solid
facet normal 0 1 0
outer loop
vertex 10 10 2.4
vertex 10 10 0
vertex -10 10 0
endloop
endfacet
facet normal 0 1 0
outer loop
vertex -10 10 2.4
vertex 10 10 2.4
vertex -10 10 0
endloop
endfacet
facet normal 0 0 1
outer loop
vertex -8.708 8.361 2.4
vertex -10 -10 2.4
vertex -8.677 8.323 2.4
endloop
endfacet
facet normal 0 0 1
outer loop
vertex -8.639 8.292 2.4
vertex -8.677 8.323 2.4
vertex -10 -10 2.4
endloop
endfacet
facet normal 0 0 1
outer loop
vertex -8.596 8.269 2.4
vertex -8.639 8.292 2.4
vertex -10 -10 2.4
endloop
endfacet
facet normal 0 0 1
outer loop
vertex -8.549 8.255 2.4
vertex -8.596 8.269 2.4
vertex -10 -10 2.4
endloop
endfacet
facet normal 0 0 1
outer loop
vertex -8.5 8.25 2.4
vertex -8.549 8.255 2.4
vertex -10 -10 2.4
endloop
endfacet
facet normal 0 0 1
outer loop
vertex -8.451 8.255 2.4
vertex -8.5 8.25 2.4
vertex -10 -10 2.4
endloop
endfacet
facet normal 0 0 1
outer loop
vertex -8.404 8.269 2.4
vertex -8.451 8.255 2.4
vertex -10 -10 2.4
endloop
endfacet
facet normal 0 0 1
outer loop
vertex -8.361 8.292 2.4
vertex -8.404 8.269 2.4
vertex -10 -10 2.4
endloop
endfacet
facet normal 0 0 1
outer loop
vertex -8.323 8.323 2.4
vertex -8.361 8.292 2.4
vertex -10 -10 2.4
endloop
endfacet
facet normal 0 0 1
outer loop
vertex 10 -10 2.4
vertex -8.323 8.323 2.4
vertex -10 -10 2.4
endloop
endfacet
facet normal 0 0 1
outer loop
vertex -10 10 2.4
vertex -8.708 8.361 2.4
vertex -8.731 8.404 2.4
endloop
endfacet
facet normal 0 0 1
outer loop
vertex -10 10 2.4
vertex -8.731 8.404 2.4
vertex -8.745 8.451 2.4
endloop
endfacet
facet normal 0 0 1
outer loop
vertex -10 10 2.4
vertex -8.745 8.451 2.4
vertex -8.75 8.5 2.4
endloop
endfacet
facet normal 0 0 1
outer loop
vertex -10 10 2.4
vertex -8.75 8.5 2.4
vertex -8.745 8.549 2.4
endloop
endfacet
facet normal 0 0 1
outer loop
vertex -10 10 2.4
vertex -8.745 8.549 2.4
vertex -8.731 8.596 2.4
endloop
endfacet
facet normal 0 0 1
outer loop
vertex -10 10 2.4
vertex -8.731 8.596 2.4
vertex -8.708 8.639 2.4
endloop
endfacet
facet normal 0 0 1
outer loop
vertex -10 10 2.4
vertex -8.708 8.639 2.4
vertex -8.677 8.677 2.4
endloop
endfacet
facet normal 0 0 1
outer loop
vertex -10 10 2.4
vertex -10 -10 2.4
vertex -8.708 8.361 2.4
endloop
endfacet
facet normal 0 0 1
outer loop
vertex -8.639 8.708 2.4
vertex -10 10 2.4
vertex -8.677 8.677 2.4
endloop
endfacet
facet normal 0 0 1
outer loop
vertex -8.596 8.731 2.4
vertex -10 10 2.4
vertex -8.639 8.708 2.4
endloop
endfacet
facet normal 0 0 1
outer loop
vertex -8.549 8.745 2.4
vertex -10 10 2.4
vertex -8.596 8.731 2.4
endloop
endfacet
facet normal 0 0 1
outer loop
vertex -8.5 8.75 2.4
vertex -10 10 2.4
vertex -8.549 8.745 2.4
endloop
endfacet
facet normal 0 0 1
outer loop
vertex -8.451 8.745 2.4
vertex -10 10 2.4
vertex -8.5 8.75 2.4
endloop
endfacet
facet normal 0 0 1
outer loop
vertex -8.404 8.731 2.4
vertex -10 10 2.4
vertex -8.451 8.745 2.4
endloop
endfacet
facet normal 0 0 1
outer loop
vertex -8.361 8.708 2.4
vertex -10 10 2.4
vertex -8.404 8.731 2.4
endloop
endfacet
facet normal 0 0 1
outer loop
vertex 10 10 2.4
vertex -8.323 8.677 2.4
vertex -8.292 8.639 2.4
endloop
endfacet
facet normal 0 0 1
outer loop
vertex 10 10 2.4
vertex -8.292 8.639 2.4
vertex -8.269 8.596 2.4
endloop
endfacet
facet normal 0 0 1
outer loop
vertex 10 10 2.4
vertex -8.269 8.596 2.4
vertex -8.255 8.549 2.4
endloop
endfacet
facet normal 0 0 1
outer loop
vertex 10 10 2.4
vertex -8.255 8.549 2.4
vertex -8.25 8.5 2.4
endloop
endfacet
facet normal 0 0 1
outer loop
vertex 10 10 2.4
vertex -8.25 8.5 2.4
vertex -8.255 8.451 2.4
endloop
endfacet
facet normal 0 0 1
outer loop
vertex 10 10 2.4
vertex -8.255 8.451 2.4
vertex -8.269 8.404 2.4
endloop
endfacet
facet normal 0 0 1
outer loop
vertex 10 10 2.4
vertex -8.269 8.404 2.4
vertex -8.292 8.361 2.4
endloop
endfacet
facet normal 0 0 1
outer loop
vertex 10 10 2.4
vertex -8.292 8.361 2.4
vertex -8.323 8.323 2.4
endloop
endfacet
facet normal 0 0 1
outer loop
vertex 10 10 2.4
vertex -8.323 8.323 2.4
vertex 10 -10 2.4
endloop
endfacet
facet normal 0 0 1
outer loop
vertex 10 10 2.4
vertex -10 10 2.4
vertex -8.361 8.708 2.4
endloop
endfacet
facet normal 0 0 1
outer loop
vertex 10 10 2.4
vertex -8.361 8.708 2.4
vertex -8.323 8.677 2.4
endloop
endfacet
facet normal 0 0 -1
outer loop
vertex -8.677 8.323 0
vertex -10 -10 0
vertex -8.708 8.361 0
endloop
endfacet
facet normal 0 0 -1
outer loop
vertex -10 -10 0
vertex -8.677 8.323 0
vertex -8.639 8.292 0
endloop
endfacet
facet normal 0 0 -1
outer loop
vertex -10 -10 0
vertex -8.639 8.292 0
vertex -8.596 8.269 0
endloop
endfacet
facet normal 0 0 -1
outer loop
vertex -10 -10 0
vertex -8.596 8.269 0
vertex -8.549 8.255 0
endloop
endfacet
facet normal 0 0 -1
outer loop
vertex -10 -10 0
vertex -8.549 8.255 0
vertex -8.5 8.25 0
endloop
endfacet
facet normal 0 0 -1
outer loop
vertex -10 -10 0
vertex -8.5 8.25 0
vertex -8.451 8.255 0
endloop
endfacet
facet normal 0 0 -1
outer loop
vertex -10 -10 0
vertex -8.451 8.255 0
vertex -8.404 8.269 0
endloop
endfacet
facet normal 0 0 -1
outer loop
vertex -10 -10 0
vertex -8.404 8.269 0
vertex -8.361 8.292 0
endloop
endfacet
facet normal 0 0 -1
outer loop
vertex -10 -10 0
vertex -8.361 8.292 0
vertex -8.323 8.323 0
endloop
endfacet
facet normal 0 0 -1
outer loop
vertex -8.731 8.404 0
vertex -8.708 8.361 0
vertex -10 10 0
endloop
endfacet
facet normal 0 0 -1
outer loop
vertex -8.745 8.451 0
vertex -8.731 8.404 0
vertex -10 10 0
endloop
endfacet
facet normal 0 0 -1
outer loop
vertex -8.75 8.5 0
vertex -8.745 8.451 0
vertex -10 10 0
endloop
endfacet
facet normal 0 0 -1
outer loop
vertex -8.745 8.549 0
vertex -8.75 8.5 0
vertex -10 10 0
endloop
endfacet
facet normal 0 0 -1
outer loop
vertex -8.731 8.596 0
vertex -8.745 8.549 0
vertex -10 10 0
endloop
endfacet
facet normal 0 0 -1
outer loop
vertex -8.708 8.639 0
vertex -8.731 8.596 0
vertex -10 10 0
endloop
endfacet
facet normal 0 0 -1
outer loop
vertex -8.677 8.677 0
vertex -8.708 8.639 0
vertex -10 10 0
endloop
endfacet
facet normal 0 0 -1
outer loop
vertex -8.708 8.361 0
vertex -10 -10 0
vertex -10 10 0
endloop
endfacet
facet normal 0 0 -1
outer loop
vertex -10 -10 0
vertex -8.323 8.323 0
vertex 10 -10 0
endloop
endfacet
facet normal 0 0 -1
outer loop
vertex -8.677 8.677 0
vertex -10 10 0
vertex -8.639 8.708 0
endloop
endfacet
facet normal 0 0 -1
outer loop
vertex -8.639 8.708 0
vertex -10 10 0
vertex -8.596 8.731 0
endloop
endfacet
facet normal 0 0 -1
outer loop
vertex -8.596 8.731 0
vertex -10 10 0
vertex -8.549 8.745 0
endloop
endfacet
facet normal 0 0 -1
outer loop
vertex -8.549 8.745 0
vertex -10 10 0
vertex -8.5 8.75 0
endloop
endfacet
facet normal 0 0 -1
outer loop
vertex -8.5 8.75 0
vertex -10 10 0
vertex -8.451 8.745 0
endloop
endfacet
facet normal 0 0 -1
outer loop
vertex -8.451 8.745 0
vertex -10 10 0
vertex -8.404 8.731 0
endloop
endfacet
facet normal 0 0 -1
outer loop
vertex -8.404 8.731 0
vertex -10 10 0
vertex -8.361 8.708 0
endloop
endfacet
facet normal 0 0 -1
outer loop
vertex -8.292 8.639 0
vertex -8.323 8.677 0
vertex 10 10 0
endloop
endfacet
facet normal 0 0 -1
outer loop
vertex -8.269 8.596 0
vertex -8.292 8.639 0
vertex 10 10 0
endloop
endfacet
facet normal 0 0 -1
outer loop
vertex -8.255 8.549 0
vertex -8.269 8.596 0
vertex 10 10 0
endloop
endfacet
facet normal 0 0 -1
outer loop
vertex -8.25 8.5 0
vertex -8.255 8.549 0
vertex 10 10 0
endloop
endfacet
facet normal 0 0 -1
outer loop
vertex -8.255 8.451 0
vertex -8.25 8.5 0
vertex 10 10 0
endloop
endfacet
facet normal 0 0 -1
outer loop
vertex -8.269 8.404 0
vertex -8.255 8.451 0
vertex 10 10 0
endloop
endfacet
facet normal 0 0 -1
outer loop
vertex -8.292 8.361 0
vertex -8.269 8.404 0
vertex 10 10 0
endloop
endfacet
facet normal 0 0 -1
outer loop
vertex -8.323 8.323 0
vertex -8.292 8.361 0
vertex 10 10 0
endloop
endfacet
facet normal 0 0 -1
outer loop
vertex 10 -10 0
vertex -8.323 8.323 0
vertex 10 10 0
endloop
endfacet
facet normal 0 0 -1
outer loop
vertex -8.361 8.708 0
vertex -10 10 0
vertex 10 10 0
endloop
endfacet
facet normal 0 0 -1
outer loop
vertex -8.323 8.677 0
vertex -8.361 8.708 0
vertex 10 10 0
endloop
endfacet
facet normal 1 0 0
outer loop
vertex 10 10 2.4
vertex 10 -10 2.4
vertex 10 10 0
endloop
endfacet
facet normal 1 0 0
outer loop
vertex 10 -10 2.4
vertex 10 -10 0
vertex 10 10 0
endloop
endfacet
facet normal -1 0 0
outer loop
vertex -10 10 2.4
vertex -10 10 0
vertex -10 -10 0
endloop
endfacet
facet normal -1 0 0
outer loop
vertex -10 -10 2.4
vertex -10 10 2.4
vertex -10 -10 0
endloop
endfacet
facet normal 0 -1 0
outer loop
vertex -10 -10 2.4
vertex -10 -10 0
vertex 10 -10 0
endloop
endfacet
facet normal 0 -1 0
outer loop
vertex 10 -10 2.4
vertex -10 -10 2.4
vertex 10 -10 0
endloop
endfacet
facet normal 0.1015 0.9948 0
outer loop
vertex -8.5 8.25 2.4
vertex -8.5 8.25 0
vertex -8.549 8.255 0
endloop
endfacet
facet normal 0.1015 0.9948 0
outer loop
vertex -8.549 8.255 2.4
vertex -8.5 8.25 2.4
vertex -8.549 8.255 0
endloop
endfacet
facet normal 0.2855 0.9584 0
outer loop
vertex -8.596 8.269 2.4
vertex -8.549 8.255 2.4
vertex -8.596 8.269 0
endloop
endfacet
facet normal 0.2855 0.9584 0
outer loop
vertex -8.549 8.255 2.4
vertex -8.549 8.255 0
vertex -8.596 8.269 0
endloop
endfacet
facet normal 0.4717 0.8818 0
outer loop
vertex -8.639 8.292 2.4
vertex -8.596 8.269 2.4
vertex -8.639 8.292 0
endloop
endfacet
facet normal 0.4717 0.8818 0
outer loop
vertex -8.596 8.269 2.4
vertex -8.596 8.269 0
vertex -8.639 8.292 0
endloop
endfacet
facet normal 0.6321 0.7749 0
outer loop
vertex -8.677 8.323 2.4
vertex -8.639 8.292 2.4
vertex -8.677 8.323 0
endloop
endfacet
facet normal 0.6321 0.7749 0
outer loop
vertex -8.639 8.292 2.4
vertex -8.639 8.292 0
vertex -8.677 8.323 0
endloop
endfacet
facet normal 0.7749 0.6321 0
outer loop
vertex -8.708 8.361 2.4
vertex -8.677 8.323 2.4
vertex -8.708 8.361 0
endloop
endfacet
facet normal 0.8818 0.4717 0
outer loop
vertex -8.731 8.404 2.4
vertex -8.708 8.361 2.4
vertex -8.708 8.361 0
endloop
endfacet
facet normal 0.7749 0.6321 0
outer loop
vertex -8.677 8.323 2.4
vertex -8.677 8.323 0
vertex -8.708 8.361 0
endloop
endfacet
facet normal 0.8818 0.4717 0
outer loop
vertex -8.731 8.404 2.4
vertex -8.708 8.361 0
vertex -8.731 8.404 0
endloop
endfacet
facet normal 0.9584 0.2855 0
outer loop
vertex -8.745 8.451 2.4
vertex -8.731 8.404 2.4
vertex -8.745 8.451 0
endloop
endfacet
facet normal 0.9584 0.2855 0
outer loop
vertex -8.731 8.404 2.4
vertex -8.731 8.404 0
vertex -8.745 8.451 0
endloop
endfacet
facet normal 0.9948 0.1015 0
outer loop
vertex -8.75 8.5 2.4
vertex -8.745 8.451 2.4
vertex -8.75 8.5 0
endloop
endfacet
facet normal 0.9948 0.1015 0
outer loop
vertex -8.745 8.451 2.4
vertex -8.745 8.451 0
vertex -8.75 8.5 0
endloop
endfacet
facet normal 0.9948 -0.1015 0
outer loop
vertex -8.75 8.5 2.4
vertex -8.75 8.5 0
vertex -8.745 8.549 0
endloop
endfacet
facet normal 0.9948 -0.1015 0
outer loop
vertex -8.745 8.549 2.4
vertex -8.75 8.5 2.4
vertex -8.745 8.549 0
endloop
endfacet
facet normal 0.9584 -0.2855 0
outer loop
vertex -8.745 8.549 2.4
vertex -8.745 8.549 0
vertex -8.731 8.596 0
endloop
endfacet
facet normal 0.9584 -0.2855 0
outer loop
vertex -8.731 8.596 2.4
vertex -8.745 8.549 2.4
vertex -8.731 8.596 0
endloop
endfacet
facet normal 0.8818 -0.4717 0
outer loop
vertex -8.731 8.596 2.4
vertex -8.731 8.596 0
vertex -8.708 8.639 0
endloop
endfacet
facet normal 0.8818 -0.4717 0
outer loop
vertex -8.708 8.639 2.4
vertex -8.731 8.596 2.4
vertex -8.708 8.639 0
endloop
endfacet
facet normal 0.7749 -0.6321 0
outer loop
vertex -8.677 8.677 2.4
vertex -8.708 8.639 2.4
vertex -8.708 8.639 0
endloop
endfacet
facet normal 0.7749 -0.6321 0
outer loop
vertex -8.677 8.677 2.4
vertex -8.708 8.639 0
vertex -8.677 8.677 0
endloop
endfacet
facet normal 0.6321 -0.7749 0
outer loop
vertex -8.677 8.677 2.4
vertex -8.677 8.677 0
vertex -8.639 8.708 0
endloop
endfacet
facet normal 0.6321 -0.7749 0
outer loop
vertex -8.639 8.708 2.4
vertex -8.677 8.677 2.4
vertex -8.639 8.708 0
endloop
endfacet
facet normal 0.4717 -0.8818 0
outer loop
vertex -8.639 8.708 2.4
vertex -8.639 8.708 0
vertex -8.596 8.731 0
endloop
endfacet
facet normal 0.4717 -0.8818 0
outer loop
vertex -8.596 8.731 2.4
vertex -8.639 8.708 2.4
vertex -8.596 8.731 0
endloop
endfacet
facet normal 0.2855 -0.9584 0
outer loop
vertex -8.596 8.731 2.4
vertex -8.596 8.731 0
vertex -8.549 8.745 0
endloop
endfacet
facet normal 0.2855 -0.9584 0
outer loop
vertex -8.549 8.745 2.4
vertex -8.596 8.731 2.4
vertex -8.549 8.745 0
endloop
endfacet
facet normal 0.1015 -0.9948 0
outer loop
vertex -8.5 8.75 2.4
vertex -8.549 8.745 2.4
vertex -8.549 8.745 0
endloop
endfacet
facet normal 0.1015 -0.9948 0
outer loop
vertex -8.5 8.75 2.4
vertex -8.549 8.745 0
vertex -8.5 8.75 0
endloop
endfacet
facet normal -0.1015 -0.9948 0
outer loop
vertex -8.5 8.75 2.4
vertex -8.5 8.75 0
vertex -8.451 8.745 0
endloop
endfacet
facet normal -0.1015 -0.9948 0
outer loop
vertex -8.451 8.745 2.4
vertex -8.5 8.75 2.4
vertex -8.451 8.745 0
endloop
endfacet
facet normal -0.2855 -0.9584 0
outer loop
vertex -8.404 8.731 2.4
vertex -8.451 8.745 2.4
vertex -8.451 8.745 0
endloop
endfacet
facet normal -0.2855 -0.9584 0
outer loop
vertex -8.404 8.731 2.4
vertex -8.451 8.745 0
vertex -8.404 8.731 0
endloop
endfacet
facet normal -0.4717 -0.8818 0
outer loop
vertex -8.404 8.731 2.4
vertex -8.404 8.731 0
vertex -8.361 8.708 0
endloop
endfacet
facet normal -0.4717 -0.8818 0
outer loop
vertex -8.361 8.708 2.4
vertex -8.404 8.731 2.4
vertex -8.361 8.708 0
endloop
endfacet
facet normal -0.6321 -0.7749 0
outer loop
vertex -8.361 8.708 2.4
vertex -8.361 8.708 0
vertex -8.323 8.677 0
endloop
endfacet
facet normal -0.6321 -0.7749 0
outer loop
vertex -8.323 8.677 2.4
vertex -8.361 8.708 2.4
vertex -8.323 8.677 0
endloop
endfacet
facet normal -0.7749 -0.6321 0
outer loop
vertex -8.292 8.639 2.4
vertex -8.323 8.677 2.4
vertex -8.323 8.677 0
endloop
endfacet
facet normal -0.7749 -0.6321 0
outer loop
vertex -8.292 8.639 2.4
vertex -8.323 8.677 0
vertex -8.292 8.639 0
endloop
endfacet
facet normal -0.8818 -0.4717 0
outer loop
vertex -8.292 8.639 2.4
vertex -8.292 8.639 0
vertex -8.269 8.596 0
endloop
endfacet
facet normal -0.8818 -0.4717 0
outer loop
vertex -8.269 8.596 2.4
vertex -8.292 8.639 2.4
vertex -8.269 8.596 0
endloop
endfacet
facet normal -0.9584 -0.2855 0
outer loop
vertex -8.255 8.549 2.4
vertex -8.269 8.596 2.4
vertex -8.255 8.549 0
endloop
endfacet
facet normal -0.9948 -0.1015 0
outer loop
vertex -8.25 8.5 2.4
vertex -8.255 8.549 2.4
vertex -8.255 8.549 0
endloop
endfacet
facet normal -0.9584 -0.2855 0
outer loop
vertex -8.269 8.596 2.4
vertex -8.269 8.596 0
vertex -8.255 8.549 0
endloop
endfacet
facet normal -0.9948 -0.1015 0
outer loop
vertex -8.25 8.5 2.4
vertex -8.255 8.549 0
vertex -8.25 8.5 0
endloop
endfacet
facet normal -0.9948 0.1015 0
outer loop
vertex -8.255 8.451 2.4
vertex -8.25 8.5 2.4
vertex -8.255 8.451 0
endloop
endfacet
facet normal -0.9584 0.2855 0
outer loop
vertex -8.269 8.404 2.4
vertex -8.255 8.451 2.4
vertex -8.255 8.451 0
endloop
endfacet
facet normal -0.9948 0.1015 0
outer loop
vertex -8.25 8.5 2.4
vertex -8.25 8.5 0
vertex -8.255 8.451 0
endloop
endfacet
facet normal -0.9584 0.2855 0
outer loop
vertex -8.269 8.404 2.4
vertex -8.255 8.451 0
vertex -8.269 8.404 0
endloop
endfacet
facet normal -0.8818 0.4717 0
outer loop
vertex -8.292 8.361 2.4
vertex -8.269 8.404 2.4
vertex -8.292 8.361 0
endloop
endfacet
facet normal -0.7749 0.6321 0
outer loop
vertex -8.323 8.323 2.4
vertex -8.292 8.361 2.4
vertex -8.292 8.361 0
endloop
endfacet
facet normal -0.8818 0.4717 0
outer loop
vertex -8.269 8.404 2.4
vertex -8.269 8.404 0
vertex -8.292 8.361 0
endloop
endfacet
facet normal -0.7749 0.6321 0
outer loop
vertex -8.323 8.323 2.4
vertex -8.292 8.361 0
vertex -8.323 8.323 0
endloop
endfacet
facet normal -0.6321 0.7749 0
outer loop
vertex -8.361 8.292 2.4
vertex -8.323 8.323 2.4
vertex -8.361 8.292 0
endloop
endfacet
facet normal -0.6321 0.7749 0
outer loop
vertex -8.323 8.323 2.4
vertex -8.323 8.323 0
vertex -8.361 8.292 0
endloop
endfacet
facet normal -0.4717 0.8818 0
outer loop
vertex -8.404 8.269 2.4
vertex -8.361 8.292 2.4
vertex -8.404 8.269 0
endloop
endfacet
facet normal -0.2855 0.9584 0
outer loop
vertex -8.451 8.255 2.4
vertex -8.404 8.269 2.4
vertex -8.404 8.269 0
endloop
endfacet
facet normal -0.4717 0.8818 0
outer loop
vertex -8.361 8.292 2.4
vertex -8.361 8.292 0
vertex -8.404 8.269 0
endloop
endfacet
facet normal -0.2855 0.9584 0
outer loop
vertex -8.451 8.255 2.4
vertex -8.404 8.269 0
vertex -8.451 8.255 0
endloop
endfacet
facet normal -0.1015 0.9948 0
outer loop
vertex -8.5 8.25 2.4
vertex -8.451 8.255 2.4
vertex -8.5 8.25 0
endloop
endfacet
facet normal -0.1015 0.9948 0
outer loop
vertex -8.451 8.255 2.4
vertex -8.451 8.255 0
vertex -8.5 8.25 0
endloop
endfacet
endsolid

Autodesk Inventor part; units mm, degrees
ref_plane "YZ Plane" through (0, 0, 0) normal (1, 0, 0) x (0, 1, 0)
ref_plane "XZ Plane" through (0, 0, 0) normal (0, 1, 0) x (-1, 0, 0)
ref_plane "XY Plane" through (0, 0, 0) normal (0, 0, 1) x (1, 0, 0)
sketch "Náčrt1" plane through (0, 0, 0) normal (0, 0, 1) x (1, 0, 0)
  line L0 (0, 0) -> (-10, 0) construction
  line L1 (-10, 0) -> (-10, -10) construction
  line L2 (-10, -10) -> (0, -10) construction
  line L3 (0, -10) -> (0, 0) construction
  line L4 (-10, -10) -> (10, -10)
  line L5 (10, -10) -> (10, 10)
  line L6 (10, 10) -> (-10, 10)
  line L7 (-10, 10) -> (-10, -10)
  dimension "d0" = 10
  dimension "d1" = 10
  dimension "d2" = 20
  dimension "d3" = 20
extrude "Vysunutí1" add sketch "Náčrt1" along normal blind 2.4
sketch "Náčrt3" plane through (0, 0, 2.4) normal (0, 0, 1) x (1, 0, 0)
  line L0 (-10, 10) -> (-10, -10) projected
  line L1 (10, 10) -> (-10, 10) projected
  point P0 (0, 0)
  point P1 (-8.5, 8.5)
  dimension "d12" = 1.5
  dimension "d13" = 1.5
hole "Díra1" at (-8.5, 8.5, 2.4) direction (0, 0, -1) diameter 0.5 end through all
properties part number "H mustek"
